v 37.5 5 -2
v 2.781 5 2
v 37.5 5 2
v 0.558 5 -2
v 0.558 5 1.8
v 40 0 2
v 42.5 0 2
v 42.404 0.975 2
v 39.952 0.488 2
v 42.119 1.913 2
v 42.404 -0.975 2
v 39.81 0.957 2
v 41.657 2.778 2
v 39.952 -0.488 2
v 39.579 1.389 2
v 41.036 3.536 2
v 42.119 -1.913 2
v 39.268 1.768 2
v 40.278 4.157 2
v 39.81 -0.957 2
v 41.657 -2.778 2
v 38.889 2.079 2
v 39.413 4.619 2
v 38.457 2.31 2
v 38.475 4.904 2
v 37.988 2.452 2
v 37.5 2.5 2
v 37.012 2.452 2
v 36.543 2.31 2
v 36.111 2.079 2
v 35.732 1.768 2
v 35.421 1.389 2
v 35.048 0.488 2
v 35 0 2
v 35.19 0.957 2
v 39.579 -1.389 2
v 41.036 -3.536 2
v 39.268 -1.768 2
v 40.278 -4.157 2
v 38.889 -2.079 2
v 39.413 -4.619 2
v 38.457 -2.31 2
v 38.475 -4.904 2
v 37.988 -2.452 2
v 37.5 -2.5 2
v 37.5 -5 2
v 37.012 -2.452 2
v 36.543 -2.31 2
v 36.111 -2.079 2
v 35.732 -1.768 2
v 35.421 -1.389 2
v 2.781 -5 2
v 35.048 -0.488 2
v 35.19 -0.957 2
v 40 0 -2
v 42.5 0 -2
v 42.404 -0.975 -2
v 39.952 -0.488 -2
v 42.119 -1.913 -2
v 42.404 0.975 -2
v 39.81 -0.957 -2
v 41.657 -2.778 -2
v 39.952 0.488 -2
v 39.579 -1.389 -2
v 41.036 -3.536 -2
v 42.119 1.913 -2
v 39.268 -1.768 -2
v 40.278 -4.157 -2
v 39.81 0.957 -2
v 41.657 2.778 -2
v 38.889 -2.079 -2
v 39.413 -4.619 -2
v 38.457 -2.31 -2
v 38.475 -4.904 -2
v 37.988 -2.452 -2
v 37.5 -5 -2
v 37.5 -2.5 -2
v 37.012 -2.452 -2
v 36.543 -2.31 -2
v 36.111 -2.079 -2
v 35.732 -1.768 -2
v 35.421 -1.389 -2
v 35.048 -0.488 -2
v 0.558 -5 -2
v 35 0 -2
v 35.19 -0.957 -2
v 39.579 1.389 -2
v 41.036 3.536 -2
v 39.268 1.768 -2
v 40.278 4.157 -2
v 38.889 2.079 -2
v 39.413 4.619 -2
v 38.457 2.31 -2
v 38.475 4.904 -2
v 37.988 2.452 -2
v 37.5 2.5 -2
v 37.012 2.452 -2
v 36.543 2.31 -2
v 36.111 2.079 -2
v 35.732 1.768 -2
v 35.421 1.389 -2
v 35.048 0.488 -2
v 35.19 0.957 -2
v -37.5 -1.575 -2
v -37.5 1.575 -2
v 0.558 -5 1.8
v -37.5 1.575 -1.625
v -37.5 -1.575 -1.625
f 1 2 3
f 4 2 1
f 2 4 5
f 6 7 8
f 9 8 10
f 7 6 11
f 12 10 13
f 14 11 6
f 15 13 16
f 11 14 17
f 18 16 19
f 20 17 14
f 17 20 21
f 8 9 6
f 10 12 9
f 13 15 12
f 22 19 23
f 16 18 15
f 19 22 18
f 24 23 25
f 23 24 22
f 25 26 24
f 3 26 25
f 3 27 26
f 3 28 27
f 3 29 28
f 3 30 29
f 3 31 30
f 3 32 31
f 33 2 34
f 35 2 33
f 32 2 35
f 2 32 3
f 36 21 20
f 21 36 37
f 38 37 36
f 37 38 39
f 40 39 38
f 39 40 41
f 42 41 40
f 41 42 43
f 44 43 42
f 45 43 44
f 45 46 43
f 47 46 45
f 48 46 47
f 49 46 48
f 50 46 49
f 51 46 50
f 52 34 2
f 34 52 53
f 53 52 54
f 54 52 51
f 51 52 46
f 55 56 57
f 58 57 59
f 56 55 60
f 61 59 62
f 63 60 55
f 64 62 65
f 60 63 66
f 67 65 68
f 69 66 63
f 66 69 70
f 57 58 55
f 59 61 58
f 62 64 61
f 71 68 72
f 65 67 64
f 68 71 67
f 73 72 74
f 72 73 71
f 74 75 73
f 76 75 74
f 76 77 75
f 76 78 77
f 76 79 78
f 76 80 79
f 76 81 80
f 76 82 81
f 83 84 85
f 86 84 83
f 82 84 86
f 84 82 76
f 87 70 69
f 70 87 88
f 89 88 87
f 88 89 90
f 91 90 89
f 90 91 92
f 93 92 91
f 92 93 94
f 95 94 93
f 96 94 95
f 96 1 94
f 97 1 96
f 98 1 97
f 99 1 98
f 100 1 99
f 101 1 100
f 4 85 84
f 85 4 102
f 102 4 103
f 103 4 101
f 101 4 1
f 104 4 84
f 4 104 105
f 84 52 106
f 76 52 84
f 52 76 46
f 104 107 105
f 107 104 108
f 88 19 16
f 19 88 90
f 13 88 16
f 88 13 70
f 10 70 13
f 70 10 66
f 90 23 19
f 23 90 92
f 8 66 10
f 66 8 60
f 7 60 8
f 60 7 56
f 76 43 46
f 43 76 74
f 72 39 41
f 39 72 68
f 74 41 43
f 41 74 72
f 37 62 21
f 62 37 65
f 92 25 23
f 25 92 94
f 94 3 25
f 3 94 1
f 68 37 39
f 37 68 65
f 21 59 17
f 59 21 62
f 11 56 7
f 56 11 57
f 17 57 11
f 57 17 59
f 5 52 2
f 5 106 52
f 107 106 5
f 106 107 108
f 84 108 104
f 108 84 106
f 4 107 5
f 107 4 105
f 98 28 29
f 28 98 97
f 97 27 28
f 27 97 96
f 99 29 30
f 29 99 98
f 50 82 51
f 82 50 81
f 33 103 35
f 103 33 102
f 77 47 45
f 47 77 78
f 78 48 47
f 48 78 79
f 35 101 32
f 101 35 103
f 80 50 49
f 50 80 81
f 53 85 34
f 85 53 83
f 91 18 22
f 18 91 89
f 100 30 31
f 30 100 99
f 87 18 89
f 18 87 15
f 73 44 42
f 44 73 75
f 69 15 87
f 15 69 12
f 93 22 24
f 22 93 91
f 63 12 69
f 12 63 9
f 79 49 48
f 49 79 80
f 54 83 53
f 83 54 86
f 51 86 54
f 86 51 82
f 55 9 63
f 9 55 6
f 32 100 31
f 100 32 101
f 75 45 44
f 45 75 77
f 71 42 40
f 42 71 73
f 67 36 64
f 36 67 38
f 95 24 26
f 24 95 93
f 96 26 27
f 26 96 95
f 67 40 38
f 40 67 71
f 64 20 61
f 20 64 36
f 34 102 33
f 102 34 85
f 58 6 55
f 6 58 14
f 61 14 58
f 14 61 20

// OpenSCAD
//car panel pry tool
//Alex Tanchoco (LionAlex)
//Dec 14,2013

handle_length = 100;
handle_width = 10;
handle_thickness = 4;

rotate( [0,0,90] ) 
{
	difference() {
	intersection() {


		translate( [0,0,-handle_thickness*0.8] )
			rotate( [90,0,0] )
				rotate( [0,0,45] )
					cylinder( h=handle_length+handle_width, r2=handle_width+handle_thickness, r1=0, $fn=4, center=true );
			base_shape();

		}
		translate( [0,-handle_length*0.375,0] )
				cylinder( h=handle_thickness, r=handle_width/4, $fn=32, center=true );
	}
}

module base_shape() {
			cube( [handle_width,handle_length*0.75,handle_thickness],center=true );
			translate( [0,-handle_length*0.375,0] )
				cylinder( h=handle_thickness, r=handle_width/2, $fn=32, center=true );
		}
